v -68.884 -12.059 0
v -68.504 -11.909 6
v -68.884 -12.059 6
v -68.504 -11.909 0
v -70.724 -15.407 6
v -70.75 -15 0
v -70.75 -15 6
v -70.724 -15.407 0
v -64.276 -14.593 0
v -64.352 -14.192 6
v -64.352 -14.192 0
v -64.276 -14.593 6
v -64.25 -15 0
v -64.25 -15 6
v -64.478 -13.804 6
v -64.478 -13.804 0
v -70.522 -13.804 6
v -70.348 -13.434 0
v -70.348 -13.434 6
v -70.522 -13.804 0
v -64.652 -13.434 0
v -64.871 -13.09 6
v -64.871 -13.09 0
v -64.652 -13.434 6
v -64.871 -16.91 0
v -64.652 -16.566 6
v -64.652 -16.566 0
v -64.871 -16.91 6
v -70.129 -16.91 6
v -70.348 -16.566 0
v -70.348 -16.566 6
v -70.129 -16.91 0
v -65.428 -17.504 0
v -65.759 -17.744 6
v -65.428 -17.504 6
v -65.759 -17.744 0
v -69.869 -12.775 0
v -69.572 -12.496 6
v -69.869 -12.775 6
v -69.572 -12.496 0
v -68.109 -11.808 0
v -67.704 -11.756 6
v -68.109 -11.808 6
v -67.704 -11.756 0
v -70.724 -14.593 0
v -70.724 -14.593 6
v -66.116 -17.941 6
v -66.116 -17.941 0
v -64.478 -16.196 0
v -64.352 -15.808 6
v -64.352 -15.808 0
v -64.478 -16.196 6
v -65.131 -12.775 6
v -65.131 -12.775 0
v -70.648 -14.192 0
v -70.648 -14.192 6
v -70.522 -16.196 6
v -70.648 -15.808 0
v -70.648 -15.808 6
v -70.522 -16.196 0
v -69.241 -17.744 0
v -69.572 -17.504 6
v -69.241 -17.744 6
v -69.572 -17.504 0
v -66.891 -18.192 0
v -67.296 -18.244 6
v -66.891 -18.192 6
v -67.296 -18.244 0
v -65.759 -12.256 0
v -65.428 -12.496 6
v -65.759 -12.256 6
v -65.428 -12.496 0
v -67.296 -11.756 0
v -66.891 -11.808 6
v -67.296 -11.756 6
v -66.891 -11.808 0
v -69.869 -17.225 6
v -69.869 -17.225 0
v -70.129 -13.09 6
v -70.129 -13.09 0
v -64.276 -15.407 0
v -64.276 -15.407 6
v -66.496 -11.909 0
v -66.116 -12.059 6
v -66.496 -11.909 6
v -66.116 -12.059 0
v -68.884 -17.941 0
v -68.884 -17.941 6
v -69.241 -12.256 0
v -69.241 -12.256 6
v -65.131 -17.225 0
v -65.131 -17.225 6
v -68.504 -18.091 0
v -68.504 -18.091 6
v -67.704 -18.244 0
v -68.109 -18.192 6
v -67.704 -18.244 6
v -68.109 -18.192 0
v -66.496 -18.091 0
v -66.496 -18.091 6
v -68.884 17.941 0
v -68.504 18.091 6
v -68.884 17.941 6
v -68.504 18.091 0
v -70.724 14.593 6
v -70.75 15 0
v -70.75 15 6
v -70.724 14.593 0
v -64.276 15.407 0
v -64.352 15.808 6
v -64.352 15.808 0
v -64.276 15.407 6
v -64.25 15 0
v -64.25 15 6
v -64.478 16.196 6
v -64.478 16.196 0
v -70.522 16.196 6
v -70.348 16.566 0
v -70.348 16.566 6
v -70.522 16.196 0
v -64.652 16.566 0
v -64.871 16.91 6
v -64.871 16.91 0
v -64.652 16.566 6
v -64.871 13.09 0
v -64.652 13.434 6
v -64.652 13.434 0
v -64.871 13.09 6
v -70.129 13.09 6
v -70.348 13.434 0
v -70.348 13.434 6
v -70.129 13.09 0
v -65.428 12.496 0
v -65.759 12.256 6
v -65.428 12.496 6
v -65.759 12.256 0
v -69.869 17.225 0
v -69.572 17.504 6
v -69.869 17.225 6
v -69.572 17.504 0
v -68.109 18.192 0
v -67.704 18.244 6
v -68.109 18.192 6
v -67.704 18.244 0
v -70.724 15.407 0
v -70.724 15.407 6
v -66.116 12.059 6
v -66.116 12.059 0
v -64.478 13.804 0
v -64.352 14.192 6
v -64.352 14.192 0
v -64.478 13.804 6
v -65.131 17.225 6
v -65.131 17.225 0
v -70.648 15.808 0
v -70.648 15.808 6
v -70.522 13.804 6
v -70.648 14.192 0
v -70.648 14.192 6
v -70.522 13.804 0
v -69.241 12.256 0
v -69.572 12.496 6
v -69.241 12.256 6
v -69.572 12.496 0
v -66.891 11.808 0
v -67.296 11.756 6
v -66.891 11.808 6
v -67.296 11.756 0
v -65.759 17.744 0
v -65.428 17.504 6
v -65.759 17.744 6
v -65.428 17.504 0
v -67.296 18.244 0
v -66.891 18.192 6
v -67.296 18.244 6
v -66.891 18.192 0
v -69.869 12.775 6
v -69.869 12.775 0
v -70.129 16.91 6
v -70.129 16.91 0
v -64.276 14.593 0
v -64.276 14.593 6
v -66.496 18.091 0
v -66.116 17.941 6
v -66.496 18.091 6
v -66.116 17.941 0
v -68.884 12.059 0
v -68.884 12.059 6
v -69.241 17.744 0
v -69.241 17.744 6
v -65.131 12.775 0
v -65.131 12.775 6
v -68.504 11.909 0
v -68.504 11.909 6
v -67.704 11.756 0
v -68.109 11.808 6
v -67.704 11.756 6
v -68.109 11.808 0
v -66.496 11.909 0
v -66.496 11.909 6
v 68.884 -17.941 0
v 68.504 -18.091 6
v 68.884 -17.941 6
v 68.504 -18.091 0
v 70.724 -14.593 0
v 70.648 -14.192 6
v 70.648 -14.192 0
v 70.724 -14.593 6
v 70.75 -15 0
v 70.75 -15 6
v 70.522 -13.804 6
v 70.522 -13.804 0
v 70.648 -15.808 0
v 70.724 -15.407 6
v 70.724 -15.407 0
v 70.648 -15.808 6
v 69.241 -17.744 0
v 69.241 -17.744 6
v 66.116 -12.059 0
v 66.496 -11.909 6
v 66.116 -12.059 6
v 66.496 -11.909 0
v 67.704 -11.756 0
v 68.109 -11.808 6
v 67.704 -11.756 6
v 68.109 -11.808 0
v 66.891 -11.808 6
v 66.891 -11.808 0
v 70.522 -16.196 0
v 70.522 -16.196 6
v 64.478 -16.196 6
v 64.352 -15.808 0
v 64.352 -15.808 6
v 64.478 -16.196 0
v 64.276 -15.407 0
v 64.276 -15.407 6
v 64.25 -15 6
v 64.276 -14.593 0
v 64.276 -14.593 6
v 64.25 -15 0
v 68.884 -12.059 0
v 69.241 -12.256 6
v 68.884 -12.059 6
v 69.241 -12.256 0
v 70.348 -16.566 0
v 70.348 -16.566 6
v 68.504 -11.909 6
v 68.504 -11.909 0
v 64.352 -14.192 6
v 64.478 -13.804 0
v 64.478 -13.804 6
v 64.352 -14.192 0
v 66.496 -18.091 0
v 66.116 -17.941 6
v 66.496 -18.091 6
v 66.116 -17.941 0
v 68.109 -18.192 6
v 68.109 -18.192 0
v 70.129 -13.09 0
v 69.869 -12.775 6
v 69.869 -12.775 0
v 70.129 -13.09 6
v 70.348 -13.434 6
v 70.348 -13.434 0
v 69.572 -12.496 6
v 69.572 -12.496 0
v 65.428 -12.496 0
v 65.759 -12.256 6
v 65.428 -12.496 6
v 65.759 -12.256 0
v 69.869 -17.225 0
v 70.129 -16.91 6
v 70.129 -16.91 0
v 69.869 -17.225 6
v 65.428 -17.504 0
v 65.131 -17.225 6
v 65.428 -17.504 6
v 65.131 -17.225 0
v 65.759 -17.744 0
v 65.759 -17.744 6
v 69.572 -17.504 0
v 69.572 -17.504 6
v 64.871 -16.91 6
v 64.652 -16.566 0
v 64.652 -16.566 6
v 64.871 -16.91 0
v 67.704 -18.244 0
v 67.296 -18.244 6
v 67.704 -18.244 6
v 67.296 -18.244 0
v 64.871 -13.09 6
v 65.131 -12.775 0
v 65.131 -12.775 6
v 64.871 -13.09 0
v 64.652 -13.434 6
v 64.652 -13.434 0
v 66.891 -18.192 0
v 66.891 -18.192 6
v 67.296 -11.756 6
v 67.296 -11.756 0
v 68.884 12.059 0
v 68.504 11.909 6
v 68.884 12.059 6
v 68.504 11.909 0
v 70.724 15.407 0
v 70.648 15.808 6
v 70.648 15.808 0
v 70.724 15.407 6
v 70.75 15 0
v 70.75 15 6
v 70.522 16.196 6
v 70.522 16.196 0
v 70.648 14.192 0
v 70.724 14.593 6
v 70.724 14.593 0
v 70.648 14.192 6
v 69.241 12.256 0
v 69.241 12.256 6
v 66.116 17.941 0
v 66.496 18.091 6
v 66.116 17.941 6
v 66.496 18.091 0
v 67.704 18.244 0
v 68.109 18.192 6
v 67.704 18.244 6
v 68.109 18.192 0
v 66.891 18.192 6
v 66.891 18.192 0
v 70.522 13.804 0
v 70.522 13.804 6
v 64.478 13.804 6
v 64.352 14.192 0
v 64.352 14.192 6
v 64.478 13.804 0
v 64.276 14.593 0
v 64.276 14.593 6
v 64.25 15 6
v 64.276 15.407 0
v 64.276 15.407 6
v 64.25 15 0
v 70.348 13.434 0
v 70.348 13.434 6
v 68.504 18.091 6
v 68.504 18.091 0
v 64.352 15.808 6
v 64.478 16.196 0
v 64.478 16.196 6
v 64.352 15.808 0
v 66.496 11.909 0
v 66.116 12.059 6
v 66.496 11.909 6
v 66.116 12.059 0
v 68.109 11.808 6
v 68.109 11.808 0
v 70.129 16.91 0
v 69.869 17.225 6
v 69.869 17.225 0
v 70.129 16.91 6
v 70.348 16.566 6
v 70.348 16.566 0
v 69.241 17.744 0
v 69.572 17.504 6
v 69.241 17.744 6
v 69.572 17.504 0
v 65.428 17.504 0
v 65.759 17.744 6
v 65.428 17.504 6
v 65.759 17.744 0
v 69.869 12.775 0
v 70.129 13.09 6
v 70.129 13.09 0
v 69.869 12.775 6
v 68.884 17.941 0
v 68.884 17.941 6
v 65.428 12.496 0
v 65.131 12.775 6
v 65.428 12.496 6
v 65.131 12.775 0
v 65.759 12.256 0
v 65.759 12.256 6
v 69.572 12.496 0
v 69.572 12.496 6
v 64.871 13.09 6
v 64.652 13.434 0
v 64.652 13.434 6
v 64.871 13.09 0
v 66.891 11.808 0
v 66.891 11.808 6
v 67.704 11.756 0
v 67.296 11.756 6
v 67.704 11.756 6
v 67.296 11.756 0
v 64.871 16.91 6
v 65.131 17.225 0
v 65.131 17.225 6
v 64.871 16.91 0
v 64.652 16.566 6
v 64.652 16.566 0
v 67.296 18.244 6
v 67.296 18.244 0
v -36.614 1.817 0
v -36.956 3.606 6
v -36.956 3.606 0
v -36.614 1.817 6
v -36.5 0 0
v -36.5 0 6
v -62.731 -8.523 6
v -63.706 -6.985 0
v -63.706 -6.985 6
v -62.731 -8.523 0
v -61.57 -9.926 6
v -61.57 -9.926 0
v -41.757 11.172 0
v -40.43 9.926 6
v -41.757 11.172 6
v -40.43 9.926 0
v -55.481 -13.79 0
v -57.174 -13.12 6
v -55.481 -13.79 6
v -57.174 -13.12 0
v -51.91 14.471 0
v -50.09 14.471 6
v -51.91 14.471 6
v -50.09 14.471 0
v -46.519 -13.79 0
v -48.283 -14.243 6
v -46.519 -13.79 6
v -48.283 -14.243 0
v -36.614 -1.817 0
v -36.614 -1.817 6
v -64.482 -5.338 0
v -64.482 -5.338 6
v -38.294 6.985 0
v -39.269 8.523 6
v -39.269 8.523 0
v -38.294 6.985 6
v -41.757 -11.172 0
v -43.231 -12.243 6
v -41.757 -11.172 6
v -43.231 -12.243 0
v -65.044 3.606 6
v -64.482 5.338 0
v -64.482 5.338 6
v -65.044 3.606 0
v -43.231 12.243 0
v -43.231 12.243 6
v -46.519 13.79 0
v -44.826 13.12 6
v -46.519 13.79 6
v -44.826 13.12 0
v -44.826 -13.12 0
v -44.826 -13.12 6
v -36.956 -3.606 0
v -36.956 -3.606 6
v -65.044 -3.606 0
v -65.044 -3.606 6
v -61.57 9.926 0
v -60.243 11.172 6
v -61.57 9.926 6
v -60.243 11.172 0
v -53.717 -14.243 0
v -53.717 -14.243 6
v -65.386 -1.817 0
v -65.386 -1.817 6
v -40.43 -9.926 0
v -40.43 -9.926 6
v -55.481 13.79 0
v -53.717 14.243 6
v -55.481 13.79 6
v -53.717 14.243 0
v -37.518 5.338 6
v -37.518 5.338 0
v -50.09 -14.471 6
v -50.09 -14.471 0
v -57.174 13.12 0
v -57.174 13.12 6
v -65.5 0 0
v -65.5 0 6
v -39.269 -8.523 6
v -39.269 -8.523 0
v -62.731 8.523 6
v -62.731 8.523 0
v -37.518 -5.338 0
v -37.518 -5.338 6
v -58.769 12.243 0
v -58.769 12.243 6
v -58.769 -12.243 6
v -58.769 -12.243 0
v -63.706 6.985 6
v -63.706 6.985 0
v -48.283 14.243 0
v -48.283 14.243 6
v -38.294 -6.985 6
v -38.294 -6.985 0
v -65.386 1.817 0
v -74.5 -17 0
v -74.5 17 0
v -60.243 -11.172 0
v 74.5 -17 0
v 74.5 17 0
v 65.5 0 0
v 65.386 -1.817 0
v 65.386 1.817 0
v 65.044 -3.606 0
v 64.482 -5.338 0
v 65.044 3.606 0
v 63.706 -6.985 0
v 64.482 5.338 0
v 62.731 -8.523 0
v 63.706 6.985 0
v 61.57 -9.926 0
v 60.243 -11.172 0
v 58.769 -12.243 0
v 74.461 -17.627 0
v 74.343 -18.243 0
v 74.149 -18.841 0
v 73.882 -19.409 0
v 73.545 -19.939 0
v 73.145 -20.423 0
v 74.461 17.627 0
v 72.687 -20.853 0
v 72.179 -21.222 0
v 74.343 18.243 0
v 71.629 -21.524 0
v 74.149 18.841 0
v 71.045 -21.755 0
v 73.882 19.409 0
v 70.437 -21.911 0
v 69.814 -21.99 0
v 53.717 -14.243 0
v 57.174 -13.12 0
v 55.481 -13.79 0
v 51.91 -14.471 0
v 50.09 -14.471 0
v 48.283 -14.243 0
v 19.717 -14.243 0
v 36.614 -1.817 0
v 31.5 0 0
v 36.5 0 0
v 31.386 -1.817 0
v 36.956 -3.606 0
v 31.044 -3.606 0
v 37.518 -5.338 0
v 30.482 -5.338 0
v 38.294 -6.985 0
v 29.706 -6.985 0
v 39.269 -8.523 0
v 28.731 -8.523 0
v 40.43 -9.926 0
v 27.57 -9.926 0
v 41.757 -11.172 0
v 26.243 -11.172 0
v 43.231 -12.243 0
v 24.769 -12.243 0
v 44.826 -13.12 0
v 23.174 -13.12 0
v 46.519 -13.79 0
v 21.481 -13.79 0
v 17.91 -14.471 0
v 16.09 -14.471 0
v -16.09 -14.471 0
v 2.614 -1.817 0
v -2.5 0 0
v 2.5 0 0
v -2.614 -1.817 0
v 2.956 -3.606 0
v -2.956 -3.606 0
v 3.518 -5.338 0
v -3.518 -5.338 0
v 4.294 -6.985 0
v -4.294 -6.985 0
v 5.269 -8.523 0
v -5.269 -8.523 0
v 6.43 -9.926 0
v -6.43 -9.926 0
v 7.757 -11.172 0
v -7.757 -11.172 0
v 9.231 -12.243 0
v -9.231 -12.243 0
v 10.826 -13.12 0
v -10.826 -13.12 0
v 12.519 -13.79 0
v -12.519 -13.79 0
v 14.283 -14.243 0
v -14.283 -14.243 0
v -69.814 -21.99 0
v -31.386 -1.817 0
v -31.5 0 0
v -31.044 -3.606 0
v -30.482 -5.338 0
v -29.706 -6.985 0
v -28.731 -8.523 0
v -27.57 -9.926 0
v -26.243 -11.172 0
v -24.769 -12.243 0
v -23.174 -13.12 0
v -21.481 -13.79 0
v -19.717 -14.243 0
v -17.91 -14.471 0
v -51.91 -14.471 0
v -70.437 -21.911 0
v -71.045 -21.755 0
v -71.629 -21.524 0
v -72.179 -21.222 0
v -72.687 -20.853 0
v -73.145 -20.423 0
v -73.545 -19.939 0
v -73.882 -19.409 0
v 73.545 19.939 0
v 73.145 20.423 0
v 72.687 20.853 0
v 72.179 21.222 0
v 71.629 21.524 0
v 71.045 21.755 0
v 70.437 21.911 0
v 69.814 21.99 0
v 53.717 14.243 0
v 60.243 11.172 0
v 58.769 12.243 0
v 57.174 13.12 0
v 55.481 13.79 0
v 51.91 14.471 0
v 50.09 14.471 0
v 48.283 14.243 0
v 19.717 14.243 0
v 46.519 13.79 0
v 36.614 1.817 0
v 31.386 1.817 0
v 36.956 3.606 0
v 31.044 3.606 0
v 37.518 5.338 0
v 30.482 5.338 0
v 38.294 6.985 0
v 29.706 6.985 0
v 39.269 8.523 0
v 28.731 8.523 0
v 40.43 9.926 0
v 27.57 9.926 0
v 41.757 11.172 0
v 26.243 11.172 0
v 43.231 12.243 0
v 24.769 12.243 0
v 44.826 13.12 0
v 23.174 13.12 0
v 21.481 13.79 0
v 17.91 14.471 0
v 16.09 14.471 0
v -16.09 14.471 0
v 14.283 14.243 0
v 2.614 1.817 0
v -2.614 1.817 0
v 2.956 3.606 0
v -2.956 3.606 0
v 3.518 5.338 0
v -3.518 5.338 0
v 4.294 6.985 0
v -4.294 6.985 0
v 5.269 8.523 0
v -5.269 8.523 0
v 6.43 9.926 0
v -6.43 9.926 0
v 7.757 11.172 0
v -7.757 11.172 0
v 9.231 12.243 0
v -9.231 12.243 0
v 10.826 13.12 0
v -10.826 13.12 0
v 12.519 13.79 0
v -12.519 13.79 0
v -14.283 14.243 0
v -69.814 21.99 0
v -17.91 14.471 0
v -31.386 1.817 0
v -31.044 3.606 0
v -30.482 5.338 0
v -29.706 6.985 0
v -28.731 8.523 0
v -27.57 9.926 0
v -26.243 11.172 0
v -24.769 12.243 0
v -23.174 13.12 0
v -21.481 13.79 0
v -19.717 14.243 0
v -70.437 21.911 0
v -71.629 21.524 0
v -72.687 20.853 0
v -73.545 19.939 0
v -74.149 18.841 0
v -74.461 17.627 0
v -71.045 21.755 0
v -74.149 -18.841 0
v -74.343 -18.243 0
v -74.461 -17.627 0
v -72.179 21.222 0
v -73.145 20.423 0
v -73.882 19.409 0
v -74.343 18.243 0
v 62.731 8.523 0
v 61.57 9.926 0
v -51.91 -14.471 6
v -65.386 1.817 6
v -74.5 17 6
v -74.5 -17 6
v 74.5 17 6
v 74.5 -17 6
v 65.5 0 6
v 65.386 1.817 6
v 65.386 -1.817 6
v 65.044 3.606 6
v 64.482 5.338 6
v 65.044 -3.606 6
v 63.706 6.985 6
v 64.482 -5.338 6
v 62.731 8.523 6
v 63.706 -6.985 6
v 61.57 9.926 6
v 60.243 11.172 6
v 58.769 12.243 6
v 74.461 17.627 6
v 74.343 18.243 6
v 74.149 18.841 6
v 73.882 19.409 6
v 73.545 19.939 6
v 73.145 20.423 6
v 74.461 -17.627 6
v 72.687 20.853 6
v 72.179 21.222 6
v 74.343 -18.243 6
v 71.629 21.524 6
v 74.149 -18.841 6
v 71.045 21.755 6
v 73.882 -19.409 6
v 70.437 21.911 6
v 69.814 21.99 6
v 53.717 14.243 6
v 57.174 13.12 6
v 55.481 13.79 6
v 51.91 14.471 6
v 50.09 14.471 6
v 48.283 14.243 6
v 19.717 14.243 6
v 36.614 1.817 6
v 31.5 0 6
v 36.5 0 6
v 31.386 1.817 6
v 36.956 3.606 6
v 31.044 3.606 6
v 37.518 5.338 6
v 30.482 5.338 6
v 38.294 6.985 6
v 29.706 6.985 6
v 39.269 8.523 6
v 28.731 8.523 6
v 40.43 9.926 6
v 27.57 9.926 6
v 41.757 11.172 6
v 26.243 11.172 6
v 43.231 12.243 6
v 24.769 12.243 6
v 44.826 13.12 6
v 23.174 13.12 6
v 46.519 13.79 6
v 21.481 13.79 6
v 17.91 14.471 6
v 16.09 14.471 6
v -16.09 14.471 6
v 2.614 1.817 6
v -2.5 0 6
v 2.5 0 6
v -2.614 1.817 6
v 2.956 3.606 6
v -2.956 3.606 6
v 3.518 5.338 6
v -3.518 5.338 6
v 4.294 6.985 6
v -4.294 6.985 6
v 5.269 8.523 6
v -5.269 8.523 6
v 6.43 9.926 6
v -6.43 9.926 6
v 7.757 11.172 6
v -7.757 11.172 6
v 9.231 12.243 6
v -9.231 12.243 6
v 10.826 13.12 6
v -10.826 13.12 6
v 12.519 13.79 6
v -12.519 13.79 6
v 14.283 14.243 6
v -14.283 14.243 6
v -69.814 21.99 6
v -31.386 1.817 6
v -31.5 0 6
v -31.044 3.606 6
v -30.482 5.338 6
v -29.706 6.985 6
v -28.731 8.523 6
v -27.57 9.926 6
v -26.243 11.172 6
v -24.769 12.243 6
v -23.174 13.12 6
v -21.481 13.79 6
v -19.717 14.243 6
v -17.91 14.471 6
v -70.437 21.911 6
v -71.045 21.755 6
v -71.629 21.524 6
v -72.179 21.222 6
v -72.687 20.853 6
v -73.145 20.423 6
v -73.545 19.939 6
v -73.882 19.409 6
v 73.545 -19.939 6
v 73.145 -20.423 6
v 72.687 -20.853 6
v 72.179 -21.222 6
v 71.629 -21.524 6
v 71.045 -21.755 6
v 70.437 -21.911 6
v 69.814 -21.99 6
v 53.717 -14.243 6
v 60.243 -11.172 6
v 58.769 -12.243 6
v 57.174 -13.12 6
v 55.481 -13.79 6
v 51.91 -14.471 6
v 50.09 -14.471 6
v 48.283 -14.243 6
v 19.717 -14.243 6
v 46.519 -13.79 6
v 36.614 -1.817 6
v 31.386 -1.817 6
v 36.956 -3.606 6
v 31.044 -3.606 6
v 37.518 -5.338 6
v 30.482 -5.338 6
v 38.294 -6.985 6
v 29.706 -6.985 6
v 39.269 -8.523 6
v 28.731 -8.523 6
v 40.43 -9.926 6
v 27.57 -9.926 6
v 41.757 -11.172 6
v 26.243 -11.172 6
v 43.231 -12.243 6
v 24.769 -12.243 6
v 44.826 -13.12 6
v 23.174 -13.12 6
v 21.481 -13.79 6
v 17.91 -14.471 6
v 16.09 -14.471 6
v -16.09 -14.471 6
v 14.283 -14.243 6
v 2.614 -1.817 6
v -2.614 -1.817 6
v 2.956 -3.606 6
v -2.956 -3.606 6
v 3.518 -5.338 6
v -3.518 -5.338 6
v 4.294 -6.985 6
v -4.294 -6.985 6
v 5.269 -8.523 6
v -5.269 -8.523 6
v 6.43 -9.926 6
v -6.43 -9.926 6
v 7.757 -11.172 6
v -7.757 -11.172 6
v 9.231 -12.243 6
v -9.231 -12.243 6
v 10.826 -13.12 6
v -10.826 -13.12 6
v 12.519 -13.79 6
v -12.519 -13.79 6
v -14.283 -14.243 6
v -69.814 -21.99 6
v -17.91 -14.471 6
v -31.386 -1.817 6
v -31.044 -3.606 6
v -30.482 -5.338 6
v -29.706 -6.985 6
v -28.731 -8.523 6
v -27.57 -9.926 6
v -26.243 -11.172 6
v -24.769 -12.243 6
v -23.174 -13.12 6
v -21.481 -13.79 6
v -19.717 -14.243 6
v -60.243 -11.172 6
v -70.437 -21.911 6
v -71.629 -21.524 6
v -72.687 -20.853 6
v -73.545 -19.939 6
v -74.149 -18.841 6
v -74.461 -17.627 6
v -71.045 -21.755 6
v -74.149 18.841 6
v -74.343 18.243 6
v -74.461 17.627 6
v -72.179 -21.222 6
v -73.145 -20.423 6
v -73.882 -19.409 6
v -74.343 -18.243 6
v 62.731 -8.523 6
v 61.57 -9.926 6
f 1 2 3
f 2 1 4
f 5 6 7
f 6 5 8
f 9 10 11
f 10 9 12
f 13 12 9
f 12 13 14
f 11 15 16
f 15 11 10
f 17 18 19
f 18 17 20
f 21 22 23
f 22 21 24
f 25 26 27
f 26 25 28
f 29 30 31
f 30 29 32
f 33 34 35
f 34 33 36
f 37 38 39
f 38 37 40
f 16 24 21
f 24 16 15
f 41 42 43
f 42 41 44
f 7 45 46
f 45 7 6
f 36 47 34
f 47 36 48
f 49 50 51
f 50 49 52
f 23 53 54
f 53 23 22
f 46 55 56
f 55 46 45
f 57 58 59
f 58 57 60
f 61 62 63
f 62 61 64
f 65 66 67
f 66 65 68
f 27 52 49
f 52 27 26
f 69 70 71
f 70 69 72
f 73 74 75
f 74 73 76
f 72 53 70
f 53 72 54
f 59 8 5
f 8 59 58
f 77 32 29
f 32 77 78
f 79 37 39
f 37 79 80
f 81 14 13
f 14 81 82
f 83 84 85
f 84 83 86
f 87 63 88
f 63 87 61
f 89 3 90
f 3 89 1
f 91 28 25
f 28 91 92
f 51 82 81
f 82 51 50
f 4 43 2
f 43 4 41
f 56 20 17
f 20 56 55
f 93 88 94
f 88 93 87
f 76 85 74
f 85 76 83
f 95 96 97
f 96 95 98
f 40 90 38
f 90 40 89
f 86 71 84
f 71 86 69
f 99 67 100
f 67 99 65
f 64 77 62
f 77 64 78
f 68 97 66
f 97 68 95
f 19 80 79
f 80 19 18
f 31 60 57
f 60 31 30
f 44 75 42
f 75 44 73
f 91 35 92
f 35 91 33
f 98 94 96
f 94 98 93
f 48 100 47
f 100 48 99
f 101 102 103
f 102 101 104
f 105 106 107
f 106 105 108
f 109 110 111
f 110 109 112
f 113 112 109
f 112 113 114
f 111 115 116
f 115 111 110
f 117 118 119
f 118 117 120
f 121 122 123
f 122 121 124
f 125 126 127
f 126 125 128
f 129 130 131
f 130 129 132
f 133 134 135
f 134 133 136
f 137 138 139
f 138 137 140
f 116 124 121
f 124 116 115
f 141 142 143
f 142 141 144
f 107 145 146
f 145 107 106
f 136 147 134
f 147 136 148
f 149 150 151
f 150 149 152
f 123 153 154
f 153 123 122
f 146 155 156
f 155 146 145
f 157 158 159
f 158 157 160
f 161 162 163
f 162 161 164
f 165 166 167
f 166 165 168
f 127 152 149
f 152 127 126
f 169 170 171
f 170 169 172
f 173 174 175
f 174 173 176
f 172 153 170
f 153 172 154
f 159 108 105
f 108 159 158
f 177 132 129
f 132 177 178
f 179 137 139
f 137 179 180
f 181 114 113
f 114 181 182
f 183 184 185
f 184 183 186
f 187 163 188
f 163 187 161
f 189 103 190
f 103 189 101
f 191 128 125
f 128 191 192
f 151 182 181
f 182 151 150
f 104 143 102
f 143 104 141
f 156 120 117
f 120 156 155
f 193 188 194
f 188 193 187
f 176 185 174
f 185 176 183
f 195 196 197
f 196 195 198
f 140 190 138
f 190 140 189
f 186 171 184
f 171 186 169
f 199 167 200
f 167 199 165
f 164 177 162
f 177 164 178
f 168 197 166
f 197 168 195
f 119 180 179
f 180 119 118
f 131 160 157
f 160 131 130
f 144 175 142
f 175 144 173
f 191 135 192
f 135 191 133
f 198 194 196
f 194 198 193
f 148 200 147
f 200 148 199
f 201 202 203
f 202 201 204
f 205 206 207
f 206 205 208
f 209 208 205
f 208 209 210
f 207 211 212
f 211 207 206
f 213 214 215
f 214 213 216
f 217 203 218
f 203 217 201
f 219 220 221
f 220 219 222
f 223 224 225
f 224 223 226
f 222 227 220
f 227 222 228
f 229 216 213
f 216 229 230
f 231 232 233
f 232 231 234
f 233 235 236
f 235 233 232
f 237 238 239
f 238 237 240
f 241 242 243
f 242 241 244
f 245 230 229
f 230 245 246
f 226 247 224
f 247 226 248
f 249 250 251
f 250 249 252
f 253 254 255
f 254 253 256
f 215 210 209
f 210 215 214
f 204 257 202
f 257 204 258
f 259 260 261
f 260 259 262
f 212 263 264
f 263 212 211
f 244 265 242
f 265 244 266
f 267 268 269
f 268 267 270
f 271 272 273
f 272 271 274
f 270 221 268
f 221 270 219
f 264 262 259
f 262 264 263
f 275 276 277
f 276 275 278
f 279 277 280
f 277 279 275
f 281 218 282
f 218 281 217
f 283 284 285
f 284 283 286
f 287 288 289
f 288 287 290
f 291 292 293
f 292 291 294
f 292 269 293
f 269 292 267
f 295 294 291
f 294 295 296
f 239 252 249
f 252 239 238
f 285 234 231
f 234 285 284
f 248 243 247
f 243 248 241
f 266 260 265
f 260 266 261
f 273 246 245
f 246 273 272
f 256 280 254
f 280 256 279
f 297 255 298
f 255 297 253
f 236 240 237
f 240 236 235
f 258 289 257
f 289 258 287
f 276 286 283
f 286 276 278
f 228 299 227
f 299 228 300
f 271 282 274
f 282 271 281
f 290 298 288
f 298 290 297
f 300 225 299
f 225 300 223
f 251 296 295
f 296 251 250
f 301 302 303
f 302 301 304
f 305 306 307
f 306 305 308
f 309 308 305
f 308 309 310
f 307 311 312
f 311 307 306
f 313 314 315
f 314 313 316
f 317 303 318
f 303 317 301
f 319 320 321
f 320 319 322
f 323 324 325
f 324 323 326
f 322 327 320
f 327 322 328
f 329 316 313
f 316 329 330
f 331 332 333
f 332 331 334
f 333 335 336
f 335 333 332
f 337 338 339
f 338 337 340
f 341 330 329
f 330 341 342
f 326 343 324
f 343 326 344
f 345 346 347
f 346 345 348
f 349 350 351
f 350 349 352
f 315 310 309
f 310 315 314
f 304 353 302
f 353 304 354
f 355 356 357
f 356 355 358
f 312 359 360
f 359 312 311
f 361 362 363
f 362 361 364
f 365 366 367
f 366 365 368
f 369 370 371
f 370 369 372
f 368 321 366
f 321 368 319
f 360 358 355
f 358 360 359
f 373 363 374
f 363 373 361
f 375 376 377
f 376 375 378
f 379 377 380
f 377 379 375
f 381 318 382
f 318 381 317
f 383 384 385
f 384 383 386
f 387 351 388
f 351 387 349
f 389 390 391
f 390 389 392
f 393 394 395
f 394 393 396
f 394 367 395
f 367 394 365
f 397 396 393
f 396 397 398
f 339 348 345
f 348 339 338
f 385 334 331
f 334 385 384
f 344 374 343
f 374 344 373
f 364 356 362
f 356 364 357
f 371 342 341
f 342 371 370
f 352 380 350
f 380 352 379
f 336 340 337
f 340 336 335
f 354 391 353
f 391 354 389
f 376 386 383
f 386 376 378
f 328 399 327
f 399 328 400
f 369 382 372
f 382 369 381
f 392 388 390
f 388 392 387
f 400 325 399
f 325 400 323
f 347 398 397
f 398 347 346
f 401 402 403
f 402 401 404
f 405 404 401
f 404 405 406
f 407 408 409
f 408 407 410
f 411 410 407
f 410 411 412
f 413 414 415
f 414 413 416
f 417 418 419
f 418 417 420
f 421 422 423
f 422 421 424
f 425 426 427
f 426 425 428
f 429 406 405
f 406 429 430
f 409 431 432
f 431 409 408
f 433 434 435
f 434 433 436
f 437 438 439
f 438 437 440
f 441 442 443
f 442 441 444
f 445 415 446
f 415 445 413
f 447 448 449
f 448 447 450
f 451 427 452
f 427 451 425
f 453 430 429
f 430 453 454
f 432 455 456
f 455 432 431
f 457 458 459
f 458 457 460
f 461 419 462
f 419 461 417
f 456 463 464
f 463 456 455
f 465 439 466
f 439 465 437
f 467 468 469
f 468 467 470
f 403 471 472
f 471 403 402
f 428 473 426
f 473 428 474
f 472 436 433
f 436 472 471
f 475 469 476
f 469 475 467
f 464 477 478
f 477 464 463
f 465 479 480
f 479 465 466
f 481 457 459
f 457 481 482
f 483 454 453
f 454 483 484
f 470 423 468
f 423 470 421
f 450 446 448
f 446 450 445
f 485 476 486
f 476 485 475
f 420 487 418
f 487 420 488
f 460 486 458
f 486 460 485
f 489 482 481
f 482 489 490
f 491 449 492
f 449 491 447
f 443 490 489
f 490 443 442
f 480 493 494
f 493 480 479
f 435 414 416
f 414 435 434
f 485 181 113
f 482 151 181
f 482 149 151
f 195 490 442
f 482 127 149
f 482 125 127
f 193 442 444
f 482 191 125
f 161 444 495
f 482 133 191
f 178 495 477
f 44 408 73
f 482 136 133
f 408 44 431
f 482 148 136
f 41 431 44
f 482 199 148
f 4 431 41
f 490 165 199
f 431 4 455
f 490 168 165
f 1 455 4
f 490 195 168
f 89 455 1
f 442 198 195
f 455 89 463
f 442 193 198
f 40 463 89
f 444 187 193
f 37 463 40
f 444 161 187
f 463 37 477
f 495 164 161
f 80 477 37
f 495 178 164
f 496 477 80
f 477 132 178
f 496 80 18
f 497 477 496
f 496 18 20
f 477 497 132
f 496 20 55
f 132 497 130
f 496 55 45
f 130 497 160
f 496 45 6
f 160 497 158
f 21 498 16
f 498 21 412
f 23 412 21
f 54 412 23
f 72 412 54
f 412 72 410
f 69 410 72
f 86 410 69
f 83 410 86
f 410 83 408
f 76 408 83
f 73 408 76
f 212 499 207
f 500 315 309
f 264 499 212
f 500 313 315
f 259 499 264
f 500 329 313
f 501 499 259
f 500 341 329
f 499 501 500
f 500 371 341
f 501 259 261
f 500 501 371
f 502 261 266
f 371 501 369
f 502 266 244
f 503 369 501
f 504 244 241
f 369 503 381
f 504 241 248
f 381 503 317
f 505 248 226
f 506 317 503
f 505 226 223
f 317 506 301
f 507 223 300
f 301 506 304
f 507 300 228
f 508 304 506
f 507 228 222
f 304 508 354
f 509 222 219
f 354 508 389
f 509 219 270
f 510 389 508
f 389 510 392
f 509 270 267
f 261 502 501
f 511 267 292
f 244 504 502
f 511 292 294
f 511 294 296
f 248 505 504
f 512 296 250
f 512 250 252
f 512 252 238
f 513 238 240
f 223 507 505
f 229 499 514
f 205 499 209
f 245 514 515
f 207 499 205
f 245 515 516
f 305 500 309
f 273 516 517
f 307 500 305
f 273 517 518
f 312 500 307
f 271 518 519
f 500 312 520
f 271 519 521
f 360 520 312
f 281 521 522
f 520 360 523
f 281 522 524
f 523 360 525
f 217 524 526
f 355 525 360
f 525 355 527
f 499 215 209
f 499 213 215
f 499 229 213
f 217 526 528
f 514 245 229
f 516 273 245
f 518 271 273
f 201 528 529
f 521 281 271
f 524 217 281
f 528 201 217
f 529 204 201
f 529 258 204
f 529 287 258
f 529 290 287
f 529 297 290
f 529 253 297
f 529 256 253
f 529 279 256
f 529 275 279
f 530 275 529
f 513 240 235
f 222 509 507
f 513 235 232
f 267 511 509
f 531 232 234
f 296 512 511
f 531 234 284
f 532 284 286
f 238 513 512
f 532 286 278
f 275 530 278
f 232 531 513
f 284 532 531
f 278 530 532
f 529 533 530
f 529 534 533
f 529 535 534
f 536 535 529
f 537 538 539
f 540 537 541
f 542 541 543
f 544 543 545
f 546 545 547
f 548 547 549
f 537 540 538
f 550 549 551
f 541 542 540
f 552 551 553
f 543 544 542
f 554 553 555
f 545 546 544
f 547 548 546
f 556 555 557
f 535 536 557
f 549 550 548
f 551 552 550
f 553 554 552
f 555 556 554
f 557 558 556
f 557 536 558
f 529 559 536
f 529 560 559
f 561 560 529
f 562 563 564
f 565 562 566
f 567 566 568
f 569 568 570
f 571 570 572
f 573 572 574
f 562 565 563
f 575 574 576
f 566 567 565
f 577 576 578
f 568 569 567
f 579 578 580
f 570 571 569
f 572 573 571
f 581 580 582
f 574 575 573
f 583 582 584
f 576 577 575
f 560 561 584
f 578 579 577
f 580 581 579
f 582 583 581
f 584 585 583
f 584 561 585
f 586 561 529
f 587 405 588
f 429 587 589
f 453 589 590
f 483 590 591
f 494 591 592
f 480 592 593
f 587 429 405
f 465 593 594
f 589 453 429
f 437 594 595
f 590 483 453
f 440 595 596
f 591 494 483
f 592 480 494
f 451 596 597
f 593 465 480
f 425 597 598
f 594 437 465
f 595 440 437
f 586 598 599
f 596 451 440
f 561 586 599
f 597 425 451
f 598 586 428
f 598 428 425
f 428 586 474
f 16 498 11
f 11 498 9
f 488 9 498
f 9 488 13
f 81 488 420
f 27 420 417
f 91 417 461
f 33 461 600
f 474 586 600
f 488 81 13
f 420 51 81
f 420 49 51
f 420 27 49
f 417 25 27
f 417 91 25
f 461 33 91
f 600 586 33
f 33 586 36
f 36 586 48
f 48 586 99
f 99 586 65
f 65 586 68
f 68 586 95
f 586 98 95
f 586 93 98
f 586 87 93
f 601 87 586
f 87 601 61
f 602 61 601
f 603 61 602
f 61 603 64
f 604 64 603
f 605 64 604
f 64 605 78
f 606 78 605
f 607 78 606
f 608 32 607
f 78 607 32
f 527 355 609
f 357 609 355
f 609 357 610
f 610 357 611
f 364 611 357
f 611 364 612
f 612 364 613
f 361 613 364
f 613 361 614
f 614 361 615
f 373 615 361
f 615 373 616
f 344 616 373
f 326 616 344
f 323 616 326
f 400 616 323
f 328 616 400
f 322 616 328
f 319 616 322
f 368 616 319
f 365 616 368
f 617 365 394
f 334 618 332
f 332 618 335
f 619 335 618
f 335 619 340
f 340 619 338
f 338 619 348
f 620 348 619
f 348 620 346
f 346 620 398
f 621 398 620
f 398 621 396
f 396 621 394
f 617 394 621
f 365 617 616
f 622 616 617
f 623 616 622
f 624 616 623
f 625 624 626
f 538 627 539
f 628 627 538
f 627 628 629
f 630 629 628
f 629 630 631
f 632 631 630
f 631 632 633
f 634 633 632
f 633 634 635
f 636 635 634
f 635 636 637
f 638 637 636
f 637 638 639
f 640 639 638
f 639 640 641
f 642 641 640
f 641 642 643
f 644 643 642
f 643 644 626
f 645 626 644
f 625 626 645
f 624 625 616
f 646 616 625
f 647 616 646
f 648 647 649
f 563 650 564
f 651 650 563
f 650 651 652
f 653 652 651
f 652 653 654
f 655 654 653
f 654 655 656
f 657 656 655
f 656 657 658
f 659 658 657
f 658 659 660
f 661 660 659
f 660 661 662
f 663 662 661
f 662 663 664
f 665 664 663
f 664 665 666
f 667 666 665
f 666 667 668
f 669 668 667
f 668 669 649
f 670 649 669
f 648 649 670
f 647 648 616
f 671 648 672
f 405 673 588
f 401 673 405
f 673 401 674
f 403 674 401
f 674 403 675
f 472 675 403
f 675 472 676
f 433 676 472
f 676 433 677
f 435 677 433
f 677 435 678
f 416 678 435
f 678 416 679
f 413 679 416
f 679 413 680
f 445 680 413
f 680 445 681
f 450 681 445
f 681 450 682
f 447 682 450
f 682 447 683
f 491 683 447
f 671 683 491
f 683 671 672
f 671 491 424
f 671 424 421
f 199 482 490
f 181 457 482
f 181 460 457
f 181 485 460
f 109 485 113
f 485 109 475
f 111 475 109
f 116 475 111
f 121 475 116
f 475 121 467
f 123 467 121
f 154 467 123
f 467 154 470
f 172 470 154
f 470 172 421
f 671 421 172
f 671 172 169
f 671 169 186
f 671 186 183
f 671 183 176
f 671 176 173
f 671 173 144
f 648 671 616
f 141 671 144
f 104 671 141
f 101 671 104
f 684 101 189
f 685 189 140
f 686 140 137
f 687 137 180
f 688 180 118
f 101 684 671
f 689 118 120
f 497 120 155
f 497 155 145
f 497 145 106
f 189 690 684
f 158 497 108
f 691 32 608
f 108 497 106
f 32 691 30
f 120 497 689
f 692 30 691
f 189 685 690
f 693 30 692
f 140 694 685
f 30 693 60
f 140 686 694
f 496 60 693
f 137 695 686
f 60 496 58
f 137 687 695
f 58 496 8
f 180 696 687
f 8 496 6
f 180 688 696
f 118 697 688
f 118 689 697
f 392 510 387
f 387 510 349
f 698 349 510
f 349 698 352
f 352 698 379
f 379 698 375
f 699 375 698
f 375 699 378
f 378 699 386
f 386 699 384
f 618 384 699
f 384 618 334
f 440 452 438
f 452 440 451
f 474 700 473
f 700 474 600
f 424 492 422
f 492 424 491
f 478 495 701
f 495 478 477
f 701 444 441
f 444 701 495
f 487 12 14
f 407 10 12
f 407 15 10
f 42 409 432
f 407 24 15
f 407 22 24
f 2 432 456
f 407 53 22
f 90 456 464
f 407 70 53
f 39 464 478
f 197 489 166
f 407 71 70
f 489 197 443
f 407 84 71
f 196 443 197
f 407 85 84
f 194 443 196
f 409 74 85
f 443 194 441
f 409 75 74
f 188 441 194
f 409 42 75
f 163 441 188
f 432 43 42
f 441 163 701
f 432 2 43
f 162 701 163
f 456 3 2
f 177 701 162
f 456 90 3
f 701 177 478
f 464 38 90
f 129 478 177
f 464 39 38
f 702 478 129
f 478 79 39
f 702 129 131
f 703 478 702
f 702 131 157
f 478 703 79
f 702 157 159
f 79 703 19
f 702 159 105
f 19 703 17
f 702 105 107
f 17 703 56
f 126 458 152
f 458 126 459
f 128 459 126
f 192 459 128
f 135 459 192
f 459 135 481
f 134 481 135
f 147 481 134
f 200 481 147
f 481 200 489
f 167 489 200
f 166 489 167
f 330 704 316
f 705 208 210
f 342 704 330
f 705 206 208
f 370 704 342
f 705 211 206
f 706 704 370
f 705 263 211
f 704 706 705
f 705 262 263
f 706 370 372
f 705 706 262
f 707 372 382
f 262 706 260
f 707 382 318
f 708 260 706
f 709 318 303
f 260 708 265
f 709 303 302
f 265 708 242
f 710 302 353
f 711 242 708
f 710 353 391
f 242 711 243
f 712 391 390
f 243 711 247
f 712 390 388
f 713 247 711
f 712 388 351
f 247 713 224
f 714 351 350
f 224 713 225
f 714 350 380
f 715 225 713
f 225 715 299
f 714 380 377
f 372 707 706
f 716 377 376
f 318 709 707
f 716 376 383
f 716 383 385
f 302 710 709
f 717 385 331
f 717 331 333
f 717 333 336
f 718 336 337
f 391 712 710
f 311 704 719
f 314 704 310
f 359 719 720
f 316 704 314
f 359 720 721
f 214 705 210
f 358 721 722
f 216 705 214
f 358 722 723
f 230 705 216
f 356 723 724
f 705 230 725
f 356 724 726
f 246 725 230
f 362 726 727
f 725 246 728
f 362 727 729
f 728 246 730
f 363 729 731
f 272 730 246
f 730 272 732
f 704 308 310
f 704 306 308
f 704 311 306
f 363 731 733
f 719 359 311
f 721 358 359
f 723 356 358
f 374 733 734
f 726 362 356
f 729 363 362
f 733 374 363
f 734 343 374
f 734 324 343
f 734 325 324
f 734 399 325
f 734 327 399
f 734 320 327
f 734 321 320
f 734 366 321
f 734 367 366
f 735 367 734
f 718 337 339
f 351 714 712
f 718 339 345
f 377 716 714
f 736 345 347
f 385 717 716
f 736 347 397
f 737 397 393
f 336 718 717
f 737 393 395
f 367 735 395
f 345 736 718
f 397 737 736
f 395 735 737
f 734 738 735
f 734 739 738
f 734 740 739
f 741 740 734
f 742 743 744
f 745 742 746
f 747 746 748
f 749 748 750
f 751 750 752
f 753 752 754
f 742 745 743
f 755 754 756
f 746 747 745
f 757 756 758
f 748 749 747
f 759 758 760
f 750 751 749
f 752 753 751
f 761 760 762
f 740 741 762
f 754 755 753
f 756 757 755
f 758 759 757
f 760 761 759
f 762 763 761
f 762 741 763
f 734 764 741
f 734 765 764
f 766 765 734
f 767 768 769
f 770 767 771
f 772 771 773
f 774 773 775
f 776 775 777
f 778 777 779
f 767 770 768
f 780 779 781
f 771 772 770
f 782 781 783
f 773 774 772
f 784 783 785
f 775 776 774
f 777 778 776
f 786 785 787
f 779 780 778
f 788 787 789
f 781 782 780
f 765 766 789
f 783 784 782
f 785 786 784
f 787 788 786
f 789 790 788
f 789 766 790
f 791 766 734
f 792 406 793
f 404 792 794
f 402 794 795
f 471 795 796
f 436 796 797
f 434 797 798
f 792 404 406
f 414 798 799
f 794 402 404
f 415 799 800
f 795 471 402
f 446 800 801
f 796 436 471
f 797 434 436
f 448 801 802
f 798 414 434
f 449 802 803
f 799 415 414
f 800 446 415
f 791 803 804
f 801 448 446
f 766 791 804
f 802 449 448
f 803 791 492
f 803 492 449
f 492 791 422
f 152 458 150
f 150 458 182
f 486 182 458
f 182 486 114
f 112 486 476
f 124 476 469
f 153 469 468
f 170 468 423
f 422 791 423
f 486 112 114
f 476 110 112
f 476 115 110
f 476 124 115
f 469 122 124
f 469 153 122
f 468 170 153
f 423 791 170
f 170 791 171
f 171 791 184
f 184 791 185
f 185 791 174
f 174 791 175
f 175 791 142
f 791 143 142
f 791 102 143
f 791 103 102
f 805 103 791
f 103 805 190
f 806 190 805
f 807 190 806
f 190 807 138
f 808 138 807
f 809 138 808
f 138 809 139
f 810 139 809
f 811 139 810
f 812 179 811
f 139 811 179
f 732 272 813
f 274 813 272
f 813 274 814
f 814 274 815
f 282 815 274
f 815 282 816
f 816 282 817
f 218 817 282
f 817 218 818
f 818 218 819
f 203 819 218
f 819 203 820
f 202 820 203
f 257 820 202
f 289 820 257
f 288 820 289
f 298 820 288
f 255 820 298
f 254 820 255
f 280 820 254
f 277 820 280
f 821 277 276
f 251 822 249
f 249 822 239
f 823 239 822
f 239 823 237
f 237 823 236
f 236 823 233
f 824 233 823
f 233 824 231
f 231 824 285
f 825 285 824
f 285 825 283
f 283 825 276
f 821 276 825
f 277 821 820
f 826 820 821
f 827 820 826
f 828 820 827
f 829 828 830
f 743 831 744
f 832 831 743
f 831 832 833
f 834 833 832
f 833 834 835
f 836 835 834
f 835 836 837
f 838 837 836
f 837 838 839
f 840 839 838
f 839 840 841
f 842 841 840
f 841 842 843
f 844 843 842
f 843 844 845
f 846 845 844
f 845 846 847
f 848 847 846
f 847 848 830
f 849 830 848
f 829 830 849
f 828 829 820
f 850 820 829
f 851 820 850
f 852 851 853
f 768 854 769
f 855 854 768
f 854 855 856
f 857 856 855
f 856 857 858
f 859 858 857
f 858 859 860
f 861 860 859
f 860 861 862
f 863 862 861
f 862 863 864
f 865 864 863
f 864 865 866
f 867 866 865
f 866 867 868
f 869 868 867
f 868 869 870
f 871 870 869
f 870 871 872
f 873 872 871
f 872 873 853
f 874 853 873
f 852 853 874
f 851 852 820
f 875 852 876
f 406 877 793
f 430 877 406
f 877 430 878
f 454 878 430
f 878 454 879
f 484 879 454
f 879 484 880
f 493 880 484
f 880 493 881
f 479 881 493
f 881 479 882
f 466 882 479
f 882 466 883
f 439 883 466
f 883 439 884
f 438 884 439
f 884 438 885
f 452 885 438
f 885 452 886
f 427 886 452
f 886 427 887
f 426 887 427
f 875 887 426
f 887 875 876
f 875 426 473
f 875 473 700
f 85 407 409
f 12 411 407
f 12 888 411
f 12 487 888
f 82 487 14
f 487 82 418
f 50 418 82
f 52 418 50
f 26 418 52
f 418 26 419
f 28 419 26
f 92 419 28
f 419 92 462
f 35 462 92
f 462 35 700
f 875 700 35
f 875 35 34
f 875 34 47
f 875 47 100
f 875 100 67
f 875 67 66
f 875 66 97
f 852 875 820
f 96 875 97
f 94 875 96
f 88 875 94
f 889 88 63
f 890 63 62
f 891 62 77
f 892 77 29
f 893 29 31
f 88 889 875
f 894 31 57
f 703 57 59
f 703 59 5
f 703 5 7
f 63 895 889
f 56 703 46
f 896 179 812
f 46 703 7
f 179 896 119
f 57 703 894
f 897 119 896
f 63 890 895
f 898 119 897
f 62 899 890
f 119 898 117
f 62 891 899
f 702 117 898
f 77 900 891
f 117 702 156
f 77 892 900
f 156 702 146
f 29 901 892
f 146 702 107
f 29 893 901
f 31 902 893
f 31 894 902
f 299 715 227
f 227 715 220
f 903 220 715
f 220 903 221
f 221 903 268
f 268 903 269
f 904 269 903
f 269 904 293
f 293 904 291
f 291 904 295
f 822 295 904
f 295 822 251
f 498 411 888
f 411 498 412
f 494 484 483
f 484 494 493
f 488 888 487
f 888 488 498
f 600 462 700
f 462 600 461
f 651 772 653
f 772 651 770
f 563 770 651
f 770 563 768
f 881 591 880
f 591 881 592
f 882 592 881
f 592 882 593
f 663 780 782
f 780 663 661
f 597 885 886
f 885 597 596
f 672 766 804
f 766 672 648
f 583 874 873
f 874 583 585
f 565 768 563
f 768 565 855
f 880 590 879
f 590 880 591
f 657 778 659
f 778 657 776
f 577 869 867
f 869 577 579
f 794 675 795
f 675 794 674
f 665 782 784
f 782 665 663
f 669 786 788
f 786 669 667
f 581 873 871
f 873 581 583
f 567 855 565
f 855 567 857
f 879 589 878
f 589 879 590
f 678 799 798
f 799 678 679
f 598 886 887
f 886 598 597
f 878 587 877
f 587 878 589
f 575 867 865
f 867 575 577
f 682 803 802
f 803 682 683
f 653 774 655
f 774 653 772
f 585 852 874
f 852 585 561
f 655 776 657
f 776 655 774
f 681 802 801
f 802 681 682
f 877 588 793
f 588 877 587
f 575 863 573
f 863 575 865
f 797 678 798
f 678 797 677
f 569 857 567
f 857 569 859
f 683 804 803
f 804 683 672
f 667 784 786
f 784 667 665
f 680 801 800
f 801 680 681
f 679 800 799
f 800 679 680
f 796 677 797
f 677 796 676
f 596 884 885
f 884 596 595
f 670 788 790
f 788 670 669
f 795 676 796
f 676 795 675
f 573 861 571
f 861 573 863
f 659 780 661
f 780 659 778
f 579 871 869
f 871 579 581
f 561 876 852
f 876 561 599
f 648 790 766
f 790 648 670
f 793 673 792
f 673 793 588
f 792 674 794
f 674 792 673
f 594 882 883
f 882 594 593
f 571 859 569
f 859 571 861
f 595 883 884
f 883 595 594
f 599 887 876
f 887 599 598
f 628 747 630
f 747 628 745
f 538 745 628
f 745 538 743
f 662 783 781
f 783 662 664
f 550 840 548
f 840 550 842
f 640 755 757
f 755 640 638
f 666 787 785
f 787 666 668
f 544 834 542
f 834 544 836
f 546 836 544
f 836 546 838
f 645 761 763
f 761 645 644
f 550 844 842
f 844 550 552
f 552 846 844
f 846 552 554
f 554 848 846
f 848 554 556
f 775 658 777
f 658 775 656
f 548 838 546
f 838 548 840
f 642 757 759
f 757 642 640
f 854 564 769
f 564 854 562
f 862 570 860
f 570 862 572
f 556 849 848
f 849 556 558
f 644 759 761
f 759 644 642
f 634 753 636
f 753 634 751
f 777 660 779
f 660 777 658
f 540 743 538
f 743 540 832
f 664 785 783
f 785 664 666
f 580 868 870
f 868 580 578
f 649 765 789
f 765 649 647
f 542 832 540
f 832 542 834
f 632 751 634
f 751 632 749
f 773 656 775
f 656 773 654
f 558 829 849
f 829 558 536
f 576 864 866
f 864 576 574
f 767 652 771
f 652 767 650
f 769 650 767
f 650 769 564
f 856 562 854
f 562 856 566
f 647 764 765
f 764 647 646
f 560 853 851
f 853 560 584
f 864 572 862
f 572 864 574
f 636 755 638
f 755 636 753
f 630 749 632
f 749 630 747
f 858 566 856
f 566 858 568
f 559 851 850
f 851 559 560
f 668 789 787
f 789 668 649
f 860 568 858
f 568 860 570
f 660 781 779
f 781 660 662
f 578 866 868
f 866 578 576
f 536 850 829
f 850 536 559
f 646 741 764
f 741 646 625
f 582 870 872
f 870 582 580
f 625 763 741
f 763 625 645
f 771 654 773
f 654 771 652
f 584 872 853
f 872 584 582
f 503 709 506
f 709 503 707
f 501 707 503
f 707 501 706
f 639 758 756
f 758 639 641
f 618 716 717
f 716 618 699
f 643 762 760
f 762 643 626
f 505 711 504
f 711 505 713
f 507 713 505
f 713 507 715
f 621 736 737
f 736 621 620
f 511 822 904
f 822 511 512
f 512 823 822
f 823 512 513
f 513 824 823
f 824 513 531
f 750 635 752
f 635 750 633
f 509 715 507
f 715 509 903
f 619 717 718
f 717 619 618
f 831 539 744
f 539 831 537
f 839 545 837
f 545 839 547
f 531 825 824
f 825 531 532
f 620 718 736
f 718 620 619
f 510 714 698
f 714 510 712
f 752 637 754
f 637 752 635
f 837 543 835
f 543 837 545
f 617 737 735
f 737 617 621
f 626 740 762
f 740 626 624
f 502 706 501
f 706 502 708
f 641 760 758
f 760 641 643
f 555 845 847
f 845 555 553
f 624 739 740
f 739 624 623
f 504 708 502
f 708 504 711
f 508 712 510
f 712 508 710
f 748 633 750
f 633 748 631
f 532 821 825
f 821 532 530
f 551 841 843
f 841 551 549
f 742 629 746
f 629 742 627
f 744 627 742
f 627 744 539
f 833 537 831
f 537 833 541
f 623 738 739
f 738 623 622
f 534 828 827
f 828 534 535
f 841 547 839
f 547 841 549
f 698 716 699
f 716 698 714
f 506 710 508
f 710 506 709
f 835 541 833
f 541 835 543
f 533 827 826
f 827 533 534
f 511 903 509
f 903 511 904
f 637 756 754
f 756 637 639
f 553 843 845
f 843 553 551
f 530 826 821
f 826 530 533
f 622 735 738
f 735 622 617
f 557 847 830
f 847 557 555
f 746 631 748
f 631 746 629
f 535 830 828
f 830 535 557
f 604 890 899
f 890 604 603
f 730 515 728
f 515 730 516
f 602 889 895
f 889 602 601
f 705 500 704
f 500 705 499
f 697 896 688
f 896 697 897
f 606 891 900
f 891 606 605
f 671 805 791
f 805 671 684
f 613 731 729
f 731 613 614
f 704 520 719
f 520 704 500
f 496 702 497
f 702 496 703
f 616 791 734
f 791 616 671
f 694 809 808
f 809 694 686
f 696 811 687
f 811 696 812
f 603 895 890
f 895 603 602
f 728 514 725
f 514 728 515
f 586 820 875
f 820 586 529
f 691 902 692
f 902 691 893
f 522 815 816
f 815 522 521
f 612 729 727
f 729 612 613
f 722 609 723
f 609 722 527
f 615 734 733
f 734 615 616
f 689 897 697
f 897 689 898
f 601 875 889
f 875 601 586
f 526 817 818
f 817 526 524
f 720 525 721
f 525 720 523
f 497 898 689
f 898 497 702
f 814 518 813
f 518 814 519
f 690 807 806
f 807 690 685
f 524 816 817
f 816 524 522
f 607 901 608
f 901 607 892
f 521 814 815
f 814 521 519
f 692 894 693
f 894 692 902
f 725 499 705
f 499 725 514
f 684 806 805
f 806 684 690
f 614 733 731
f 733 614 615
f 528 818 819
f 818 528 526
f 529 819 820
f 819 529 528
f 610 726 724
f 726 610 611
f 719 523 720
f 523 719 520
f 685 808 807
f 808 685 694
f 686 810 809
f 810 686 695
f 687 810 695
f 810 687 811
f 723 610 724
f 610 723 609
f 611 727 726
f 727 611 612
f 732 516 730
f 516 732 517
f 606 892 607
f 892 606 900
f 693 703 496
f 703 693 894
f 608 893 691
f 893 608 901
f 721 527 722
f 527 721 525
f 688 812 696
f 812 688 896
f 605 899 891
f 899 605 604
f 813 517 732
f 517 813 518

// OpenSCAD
$fn = 50;


difference() {
	union() {
		hull() {
			translate(v = [-69.5000000000, 17.0000000000, 0]) {
				cylinder(h = 6, r = 5);
			}
			translate(v = [69.5000000000, 17.0000000000, 0]) {
				cylinder(h = 6, r = 5);
			}
			translate(v = [-69.5000000000, -17.0000000000, 0]) {
				cylinder(h = 6, r = 5);
			}
			translate(v = [69.5000000000, -17.0000000000, 0]) {
				cylinder(h = 6, r = 5);
			}
		}
	}
	union() {
		#translate(v = [-67.5000000000, -15.0000000000, -100.0000000000]) {
			cylinder(h = 200, r = 3.2500000000);
		}
		#translate(v = [-67.5000000000, 15.0000000000, -100.0000000000]) {
			cylinder(h = 200, r = 3.2500000000);
		}
		#translate(v = [67.5000000000, -15.0000000000, -100.0000000000]) {
			cylinder(h = 200, r = 3.2500000000);
		}
		#translate(v = [67.5000000000, 15.0000000000, -100.0000000000]) {
			cylinder(h = 200, r = 3.2500000000);
		}
		#translate(v = [-51.0000000000, 0, 0]) {
			cylinder(h = 6, r = 14.5000000000);
		}
		#translate(v = [-17.0000000000, 0, 0]) {
			cylinder(h = 6, r = 14.5000000000);
		}
		#translate(v = [17.0000000000, 0, 0]) {
			cylinder(h = 6, r = 14.5000000000);
		}
		#translate(v = [51.0000000000, 0, 0]) {
			cylinder(h = 6, r = 14.5000000000);
		}
	}
}
